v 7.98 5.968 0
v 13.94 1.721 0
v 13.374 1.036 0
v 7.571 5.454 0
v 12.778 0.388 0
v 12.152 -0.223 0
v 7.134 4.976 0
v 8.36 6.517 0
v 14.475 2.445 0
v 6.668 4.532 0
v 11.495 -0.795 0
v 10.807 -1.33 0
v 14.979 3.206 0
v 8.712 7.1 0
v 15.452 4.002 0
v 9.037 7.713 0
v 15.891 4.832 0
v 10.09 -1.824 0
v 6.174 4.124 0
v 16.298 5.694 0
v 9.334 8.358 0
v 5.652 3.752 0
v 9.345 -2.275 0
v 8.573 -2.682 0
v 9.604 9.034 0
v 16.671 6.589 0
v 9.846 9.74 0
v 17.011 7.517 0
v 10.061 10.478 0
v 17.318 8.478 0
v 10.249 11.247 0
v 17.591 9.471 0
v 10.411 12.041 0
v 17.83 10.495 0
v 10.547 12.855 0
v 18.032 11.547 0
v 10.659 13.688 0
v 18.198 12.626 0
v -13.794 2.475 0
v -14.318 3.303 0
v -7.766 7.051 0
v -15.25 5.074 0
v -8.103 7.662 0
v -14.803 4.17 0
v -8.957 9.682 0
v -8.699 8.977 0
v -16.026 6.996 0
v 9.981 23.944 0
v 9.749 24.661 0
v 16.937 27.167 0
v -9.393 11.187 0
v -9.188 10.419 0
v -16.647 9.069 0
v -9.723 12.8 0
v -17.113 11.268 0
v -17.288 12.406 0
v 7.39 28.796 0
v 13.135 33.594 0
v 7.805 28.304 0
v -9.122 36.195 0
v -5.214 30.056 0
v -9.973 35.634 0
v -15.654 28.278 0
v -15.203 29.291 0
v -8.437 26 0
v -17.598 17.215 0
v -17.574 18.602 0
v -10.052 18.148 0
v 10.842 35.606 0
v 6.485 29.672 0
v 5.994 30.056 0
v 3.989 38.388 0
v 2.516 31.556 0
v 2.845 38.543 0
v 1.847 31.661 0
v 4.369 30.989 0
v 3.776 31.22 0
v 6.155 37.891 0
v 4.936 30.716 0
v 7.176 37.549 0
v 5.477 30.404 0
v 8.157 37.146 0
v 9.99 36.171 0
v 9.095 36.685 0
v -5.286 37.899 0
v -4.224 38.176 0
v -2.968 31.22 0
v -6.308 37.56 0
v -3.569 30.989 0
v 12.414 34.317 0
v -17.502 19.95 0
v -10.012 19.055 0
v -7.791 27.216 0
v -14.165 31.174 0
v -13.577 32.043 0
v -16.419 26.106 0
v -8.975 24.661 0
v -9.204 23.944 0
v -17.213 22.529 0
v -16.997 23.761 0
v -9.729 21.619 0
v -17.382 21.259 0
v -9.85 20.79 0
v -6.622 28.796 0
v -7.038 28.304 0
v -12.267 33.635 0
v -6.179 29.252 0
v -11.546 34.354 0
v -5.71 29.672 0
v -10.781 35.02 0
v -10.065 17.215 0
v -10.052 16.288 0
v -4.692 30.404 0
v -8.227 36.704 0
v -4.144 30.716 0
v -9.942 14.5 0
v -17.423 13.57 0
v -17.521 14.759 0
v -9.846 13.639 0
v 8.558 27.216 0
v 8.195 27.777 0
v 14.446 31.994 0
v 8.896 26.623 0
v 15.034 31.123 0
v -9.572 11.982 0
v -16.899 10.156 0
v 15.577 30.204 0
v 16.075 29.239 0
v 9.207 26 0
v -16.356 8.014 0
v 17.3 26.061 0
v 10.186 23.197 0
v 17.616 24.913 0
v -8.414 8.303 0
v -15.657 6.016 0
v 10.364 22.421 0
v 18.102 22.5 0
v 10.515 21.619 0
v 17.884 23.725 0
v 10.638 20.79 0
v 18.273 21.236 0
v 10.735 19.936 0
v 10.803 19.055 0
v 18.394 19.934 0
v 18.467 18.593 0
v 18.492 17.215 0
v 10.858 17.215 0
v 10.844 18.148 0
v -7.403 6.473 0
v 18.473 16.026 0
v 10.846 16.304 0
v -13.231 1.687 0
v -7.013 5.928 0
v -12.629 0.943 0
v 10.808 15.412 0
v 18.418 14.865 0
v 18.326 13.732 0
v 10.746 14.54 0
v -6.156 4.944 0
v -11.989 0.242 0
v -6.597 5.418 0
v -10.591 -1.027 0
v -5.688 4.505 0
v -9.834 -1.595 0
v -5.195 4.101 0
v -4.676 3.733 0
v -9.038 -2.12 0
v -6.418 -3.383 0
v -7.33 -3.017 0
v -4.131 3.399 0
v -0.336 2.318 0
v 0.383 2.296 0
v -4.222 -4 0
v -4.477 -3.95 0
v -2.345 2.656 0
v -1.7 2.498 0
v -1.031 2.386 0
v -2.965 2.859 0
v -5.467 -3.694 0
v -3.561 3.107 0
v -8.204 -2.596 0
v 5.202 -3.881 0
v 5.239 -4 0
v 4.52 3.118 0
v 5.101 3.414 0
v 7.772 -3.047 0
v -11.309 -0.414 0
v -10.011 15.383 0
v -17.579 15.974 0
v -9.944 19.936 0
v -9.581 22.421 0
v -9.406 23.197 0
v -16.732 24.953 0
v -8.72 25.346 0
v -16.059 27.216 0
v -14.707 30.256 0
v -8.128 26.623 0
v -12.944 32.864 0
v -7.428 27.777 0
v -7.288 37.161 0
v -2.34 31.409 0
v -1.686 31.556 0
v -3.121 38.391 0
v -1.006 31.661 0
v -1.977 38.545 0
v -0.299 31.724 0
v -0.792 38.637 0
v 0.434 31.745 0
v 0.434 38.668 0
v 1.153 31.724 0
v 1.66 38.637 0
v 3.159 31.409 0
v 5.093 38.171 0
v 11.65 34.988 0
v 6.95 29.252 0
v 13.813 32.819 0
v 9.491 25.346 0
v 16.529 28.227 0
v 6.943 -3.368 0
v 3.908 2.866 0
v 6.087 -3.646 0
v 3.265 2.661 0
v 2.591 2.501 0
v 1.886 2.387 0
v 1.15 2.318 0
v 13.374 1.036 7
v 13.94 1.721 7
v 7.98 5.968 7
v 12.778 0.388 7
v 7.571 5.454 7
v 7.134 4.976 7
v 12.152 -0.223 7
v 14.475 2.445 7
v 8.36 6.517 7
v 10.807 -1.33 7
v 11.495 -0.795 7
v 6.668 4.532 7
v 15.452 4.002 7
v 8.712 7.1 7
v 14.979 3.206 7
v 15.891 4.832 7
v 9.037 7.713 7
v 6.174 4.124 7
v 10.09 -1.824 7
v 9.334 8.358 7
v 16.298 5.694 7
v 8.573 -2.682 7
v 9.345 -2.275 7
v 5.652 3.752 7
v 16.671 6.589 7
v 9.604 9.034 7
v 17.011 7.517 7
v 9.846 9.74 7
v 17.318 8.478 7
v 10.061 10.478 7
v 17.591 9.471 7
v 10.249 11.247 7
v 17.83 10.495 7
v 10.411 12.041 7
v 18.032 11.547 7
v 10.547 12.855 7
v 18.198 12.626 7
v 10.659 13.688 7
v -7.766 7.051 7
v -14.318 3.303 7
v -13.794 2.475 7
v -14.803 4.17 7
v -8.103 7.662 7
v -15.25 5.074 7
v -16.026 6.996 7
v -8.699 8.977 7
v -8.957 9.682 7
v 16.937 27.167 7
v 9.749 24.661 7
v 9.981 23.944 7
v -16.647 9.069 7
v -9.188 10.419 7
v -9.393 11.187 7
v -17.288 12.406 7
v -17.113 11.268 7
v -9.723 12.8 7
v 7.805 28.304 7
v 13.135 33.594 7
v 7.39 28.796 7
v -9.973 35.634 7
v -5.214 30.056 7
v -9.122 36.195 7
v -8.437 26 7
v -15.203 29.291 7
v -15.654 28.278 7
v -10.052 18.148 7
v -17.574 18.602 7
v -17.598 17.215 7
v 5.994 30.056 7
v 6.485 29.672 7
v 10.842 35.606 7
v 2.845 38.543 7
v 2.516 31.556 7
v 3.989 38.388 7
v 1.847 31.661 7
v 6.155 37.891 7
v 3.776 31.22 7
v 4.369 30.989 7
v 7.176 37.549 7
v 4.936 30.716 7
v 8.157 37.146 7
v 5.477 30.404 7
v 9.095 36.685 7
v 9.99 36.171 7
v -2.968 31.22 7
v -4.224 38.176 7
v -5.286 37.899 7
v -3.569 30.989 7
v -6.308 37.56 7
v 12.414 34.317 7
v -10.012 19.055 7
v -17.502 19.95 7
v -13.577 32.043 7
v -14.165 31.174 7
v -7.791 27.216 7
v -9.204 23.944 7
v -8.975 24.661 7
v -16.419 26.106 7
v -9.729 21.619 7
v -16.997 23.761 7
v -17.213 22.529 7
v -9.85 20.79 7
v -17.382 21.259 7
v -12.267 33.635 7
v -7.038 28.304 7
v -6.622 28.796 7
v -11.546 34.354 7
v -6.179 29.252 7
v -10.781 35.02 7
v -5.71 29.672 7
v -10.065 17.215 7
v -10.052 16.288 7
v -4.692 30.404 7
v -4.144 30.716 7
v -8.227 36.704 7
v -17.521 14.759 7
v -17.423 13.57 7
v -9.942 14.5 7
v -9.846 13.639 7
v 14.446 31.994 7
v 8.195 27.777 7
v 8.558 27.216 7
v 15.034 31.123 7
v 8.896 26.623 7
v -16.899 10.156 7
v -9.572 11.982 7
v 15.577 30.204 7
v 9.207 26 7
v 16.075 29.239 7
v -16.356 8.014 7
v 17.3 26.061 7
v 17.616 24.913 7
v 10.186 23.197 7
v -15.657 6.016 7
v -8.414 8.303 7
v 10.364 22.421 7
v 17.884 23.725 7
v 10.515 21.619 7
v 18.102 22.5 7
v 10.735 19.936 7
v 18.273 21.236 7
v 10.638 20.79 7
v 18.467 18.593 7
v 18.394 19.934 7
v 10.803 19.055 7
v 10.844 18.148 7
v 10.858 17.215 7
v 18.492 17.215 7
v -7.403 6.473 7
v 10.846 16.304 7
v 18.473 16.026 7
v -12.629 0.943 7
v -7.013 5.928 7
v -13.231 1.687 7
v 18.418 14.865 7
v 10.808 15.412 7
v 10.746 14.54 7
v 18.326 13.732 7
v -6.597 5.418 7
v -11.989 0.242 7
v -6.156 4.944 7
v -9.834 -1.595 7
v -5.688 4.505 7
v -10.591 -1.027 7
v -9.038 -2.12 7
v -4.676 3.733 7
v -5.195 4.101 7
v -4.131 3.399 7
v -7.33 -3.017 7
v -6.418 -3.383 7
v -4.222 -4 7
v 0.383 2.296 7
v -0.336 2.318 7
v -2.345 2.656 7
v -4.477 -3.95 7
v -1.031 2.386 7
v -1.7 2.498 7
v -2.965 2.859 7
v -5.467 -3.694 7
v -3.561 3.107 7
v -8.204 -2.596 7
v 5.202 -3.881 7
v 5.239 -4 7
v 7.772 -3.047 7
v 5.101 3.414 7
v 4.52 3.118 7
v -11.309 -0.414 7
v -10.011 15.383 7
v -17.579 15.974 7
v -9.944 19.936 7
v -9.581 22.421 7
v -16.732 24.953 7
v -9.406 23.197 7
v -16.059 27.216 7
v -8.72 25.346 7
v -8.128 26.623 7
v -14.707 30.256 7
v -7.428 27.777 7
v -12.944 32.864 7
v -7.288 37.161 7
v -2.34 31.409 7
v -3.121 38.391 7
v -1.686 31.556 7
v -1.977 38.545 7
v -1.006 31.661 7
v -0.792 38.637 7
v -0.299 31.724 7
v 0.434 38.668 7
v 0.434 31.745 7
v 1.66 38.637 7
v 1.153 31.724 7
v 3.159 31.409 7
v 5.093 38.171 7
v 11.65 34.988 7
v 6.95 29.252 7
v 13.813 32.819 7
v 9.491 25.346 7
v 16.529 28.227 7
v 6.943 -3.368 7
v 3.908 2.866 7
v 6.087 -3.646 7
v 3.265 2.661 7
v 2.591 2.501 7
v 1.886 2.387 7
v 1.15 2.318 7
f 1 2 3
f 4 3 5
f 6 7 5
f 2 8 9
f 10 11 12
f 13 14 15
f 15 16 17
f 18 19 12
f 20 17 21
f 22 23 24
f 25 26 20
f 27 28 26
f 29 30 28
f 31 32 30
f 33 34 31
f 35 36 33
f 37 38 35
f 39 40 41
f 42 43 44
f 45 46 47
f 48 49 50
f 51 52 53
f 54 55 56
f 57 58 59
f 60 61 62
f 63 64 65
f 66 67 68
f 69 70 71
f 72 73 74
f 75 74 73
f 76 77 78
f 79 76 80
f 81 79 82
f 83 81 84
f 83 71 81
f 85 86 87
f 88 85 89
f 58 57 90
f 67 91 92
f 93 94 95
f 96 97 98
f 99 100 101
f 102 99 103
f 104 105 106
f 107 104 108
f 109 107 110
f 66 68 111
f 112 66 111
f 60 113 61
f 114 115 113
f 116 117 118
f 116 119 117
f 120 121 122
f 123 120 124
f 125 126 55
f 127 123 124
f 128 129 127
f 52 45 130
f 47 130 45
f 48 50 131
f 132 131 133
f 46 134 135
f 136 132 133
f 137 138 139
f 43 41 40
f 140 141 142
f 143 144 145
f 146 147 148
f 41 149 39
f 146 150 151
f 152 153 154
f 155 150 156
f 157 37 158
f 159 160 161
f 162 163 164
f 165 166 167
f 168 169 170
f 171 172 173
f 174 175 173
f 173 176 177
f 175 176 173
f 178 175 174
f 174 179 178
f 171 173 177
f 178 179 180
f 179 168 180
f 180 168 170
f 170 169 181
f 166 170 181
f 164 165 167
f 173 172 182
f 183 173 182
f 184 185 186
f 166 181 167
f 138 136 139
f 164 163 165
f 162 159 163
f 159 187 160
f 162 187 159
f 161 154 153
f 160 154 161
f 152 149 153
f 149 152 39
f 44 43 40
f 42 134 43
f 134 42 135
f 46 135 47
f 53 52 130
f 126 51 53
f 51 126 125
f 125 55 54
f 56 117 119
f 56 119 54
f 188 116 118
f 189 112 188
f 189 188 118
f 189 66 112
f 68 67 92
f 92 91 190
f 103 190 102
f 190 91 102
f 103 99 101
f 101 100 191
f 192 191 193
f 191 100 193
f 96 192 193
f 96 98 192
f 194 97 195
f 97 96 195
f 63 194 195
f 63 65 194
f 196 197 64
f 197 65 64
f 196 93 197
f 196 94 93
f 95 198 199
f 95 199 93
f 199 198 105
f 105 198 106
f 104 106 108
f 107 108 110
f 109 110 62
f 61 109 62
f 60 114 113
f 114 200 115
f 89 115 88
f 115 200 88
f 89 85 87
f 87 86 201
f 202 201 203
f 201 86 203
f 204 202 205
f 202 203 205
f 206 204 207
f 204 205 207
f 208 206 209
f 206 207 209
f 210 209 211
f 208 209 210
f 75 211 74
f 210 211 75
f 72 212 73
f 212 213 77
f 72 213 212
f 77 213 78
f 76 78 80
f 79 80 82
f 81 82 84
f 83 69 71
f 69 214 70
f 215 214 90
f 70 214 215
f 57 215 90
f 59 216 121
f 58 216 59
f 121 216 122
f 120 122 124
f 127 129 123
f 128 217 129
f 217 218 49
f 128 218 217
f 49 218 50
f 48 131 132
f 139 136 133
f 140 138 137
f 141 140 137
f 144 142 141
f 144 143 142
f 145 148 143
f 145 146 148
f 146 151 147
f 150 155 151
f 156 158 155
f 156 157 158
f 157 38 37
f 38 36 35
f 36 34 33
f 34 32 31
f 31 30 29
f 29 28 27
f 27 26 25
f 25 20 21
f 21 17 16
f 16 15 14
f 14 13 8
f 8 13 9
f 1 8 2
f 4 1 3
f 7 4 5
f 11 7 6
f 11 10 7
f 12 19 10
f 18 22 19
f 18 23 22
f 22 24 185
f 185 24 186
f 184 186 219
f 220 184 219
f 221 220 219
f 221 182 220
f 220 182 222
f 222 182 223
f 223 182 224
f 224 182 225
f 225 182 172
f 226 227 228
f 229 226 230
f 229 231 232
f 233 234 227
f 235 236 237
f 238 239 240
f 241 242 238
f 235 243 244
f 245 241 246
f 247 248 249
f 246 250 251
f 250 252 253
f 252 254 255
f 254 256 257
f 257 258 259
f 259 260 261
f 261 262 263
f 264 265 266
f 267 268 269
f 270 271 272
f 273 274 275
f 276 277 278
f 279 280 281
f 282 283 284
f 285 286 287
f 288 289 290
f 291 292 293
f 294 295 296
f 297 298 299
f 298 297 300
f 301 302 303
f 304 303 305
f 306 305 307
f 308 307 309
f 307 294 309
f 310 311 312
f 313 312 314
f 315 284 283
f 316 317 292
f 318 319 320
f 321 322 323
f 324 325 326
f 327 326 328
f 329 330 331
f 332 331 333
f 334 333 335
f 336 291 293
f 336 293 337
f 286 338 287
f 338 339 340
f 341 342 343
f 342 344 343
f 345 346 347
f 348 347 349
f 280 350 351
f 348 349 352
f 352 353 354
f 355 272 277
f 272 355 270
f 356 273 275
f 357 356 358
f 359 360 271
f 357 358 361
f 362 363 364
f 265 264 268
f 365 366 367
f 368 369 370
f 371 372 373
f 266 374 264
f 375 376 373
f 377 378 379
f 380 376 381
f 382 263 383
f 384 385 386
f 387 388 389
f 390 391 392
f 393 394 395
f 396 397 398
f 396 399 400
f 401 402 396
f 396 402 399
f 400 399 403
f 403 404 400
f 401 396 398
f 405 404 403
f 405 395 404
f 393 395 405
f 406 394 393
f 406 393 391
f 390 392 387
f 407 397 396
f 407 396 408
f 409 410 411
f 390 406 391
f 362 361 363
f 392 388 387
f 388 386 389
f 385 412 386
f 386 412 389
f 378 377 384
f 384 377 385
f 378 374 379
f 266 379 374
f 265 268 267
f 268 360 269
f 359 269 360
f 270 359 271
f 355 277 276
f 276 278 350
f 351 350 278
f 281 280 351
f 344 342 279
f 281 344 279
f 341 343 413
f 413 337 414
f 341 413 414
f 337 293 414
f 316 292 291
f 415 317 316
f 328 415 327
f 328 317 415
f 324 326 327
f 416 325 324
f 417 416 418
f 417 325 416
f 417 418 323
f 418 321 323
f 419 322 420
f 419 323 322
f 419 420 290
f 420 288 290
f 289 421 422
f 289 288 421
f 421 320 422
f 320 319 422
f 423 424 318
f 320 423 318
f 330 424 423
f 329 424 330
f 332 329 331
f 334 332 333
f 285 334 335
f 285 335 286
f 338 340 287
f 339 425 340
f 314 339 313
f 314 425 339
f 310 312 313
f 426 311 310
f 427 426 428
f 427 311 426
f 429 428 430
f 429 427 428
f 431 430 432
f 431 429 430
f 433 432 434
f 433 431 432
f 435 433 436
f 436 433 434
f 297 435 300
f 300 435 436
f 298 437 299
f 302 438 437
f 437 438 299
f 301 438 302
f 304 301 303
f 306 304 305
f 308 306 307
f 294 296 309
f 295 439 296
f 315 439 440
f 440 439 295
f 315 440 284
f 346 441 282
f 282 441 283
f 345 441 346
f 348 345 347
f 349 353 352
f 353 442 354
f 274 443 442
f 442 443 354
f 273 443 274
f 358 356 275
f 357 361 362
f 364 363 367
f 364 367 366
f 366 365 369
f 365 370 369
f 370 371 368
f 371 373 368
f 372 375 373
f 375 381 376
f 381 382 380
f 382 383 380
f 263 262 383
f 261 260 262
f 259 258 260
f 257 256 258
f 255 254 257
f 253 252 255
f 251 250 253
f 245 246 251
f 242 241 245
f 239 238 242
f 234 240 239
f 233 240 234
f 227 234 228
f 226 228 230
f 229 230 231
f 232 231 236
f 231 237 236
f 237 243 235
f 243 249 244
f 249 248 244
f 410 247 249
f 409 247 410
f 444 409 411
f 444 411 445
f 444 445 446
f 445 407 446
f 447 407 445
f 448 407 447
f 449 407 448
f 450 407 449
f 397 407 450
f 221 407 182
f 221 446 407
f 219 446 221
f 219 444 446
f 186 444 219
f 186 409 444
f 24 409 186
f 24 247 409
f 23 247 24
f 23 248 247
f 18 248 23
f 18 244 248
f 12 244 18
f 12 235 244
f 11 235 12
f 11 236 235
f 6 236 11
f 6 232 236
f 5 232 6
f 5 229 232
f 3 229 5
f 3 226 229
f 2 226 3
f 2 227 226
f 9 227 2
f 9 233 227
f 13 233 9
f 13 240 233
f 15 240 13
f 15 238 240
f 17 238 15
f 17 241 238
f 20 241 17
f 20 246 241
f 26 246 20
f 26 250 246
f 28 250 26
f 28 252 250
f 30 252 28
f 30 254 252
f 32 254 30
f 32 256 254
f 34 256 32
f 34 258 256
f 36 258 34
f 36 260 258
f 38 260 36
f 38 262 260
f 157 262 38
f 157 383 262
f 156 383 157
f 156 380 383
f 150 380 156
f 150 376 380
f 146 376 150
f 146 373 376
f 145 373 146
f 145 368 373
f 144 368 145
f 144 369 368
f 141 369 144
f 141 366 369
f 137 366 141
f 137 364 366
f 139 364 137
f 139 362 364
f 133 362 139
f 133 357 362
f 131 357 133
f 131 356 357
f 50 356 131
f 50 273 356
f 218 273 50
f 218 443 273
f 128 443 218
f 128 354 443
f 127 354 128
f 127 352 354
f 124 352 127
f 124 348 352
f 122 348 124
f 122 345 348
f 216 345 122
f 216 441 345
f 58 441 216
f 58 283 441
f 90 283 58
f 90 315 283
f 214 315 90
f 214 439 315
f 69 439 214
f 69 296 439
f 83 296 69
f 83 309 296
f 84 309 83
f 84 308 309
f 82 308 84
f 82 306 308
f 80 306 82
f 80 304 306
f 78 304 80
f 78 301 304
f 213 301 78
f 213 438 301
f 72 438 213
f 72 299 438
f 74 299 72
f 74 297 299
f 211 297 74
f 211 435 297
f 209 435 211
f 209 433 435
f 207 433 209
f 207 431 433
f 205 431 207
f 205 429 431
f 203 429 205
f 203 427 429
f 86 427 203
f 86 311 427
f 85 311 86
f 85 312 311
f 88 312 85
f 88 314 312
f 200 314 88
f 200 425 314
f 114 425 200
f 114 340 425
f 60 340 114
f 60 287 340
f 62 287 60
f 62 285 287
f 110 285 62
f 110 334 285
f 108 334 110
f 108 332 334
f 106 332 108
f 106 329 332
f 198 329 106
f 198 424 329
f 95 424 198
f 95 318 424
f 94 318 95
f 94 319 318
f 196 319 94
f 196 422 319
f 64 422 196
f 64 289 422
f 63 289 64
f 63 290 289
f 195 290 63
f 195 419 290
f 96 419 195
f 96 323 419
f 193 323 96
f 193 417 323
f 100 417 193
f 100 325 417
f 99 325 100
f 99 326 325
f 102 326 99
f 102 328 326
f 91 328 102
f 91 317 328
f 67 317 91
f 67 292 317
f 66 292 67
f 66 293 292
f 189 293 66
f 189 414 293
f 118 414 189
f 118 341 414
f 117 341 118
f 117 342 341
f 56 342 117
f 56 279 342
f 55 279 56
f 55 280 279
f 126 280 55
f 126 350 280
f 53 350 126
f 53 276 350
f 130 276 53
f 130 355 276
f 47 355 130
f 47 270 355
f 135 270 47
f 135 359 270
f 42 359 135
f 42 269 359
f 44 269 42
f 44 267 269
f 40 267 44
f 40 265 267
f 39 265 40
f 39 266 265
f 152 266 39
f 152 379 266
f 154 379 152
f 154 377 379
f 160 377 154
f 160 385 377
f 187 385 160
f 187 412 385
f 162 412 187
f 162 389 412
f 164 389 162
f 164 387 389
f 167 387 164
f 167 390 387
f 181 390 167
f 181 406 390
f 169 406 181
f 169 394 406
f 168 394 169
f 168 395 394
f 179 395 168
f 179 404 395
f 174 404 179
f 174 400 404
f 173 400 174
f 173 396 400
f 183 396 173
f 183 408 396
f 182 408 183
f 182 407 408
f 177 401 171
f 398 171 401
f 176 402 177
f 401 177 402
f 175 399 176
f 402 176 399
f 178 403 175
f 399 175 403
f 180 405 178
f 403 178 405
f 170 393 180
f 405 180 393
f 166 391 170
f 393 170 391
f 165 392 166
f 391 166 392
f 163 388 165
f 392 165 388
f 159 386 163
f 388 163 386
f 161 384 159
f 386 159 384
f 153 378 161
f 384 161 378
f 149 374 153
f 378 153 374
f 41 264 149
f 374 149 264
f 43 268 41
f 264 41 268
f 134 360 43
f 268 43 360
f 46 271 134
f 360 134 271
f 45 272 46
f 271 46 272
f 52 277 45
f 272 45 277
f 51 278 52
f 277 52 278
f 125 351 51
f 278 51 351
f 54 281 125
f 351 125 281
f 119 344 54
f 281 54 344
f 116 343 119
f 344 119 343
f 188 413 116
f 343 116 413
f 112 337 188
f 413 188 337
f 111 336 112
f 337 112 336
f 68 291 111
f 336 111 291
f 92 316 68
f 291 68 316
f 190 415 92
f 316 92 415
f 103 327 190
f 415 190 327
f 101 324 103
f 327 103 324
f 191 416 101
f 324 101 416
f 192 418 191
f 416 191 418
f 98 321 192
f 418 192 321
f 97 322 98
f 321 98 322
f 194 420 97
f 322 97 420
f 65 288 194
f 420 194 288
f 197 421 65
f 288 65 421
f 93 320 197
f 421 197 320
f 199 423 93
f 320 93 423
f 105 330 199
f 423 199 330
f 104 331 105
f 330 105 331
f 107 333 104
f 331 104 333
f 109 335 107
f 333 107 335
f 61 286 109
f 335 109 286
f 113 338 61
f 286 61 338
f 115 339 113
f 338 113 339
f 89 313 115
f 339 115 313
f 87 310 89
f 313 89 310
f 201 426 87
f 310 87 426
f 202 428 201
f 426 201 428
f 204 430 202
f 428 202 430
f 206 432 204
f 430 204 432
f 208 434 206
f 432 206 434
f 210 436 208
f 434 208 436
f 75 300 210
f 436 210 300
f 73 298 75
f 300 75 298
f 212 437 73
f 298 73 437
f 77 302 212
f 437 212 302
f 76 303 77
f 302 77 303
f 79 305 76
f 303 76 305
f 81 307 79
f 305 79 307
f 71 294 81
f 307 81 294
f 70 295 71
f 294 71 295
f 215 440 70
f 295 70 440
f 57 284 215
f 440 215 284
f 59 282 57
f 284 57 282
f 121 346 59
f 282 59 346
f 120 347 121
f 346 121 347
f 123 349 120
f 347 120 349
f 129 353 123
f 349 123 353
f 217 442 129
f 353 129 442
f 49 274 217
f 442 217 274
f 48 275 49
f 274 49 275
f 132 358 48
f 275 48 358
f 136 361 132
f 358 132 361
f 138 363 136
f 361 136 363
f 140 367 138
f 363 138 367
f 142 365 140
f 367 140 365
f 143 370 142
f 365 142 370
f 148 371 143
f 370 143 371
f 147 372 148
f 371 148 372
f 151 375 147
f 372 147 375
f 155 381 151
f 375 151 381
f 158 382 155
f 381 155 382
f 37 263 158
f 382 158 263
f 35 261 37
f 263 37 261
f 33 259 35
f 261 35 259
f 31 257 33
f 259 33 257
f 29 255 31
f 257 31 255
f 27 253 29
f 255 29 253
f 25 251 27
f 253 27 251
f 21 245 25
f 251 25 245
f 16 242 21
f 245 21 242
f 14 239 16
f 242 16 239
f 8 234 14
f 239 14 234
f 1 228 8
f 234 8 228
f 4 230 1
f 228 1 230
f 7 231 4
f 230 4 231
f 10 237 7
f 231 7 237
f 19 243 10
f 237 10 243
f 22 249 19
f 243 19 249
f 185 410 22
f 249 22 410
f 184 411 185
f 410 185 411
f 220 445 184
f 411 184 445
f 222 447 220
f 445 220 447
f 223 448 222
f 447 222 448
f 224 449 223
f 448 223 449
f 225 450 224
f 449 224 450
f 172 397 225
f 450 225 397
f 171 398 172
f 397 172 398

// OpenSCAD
// file: glyph.scad
// glyph — the shared geometry of every letter in the set. Defines named geometry
// only, so it renders nothing on its own; each letter part includes it and calls
// letter(). Every dimension lives in ../../lib/common.scad.
//
// A LETTER IS NOTHING BUT A LETTER. No plinth, no tongue, no tab — it is the
// bare glyph, and it attaches by standing in the deck groove and resting on the
// groove's floor. Anything else on it would be a distraction on a learning toy.
//
// It is a flat plate of one thickness, printed face-down: no overhang anywhere,
// no supports, and the face on the bed comes out smoothest.
//
// TWO TRAPS WITH text():
//
//  * A missing font FALLS BACK SILENTLY — no warning, no error, just different
//    letters. "Liberation Sans" was the first choice here because OpenSCAD
//    bundles it; on macOS the bundled faces are not registered with fontconfig,
//    so it rendered the fallback face instead and nothing said so. To check a
//    font resolved, render a string with it and with a deliberately bogus name
//    and compare bounding boxes: identical means it fell back.
//  * `size` is not the cap height in general. For Helvetica Bold they coincide
//    (size 44 -> 44.0 mm cap), which is why letter_size reads as a height.
//    Change the font and re-measure.

include <../../lib/common.scad>

// The letter's outline, upright in the XY plane, ready to be extruded along Z
// (which is the letter's thickness, and the print's build axis).
//
//   y = 0   is the deck surface
//   y < 0   is the part standing down inside the groove. It reaches letter_bury,
//           which is where the tapered groove closes to letter_t — NOT the
//           groove's floor. The letter wedges; it never bottoms out.
module glyph_2d(ch) {
    intersection() {
        translate([0, -letter_bury])
            scale([letter_condense, 1])
                text(ch, size = letter_size, font = letter_font,
                     halign = "center", valign = "baseline");
        // Trimmed flat at the baseline. Round letters (O, C, G, S) overshoot the
        // baseline by design, and a letter standing on a convex curve rocks —
        // there is nothing to stop it leaning. The trim costs nothing visible
        // and gives every letter a flat foot on the groove floor.
        translate([-200, -letter_bury]) square([400, 400]);
    }
}

// One letter, in its print orientation: lying on its face, thickness up Z.
module letter(ch) {
    linear_extrude(letter_t) glyph_2d(ch);
}

// Where that letter sits once it is dropped into a chassis, for fit checks.
module letter_fitted(ch) {
    translate([0, letter_t/2, body_top]) rotate([90, 0, 0]) letter(ch);
}
// main file
// letter Q — one part. See glyph.scad for the geometry and lib/common.scad for
// the dimensions. Prints lying on its face, exactly as exported: no supports.

include <glyph.scad>

letter("Q");
